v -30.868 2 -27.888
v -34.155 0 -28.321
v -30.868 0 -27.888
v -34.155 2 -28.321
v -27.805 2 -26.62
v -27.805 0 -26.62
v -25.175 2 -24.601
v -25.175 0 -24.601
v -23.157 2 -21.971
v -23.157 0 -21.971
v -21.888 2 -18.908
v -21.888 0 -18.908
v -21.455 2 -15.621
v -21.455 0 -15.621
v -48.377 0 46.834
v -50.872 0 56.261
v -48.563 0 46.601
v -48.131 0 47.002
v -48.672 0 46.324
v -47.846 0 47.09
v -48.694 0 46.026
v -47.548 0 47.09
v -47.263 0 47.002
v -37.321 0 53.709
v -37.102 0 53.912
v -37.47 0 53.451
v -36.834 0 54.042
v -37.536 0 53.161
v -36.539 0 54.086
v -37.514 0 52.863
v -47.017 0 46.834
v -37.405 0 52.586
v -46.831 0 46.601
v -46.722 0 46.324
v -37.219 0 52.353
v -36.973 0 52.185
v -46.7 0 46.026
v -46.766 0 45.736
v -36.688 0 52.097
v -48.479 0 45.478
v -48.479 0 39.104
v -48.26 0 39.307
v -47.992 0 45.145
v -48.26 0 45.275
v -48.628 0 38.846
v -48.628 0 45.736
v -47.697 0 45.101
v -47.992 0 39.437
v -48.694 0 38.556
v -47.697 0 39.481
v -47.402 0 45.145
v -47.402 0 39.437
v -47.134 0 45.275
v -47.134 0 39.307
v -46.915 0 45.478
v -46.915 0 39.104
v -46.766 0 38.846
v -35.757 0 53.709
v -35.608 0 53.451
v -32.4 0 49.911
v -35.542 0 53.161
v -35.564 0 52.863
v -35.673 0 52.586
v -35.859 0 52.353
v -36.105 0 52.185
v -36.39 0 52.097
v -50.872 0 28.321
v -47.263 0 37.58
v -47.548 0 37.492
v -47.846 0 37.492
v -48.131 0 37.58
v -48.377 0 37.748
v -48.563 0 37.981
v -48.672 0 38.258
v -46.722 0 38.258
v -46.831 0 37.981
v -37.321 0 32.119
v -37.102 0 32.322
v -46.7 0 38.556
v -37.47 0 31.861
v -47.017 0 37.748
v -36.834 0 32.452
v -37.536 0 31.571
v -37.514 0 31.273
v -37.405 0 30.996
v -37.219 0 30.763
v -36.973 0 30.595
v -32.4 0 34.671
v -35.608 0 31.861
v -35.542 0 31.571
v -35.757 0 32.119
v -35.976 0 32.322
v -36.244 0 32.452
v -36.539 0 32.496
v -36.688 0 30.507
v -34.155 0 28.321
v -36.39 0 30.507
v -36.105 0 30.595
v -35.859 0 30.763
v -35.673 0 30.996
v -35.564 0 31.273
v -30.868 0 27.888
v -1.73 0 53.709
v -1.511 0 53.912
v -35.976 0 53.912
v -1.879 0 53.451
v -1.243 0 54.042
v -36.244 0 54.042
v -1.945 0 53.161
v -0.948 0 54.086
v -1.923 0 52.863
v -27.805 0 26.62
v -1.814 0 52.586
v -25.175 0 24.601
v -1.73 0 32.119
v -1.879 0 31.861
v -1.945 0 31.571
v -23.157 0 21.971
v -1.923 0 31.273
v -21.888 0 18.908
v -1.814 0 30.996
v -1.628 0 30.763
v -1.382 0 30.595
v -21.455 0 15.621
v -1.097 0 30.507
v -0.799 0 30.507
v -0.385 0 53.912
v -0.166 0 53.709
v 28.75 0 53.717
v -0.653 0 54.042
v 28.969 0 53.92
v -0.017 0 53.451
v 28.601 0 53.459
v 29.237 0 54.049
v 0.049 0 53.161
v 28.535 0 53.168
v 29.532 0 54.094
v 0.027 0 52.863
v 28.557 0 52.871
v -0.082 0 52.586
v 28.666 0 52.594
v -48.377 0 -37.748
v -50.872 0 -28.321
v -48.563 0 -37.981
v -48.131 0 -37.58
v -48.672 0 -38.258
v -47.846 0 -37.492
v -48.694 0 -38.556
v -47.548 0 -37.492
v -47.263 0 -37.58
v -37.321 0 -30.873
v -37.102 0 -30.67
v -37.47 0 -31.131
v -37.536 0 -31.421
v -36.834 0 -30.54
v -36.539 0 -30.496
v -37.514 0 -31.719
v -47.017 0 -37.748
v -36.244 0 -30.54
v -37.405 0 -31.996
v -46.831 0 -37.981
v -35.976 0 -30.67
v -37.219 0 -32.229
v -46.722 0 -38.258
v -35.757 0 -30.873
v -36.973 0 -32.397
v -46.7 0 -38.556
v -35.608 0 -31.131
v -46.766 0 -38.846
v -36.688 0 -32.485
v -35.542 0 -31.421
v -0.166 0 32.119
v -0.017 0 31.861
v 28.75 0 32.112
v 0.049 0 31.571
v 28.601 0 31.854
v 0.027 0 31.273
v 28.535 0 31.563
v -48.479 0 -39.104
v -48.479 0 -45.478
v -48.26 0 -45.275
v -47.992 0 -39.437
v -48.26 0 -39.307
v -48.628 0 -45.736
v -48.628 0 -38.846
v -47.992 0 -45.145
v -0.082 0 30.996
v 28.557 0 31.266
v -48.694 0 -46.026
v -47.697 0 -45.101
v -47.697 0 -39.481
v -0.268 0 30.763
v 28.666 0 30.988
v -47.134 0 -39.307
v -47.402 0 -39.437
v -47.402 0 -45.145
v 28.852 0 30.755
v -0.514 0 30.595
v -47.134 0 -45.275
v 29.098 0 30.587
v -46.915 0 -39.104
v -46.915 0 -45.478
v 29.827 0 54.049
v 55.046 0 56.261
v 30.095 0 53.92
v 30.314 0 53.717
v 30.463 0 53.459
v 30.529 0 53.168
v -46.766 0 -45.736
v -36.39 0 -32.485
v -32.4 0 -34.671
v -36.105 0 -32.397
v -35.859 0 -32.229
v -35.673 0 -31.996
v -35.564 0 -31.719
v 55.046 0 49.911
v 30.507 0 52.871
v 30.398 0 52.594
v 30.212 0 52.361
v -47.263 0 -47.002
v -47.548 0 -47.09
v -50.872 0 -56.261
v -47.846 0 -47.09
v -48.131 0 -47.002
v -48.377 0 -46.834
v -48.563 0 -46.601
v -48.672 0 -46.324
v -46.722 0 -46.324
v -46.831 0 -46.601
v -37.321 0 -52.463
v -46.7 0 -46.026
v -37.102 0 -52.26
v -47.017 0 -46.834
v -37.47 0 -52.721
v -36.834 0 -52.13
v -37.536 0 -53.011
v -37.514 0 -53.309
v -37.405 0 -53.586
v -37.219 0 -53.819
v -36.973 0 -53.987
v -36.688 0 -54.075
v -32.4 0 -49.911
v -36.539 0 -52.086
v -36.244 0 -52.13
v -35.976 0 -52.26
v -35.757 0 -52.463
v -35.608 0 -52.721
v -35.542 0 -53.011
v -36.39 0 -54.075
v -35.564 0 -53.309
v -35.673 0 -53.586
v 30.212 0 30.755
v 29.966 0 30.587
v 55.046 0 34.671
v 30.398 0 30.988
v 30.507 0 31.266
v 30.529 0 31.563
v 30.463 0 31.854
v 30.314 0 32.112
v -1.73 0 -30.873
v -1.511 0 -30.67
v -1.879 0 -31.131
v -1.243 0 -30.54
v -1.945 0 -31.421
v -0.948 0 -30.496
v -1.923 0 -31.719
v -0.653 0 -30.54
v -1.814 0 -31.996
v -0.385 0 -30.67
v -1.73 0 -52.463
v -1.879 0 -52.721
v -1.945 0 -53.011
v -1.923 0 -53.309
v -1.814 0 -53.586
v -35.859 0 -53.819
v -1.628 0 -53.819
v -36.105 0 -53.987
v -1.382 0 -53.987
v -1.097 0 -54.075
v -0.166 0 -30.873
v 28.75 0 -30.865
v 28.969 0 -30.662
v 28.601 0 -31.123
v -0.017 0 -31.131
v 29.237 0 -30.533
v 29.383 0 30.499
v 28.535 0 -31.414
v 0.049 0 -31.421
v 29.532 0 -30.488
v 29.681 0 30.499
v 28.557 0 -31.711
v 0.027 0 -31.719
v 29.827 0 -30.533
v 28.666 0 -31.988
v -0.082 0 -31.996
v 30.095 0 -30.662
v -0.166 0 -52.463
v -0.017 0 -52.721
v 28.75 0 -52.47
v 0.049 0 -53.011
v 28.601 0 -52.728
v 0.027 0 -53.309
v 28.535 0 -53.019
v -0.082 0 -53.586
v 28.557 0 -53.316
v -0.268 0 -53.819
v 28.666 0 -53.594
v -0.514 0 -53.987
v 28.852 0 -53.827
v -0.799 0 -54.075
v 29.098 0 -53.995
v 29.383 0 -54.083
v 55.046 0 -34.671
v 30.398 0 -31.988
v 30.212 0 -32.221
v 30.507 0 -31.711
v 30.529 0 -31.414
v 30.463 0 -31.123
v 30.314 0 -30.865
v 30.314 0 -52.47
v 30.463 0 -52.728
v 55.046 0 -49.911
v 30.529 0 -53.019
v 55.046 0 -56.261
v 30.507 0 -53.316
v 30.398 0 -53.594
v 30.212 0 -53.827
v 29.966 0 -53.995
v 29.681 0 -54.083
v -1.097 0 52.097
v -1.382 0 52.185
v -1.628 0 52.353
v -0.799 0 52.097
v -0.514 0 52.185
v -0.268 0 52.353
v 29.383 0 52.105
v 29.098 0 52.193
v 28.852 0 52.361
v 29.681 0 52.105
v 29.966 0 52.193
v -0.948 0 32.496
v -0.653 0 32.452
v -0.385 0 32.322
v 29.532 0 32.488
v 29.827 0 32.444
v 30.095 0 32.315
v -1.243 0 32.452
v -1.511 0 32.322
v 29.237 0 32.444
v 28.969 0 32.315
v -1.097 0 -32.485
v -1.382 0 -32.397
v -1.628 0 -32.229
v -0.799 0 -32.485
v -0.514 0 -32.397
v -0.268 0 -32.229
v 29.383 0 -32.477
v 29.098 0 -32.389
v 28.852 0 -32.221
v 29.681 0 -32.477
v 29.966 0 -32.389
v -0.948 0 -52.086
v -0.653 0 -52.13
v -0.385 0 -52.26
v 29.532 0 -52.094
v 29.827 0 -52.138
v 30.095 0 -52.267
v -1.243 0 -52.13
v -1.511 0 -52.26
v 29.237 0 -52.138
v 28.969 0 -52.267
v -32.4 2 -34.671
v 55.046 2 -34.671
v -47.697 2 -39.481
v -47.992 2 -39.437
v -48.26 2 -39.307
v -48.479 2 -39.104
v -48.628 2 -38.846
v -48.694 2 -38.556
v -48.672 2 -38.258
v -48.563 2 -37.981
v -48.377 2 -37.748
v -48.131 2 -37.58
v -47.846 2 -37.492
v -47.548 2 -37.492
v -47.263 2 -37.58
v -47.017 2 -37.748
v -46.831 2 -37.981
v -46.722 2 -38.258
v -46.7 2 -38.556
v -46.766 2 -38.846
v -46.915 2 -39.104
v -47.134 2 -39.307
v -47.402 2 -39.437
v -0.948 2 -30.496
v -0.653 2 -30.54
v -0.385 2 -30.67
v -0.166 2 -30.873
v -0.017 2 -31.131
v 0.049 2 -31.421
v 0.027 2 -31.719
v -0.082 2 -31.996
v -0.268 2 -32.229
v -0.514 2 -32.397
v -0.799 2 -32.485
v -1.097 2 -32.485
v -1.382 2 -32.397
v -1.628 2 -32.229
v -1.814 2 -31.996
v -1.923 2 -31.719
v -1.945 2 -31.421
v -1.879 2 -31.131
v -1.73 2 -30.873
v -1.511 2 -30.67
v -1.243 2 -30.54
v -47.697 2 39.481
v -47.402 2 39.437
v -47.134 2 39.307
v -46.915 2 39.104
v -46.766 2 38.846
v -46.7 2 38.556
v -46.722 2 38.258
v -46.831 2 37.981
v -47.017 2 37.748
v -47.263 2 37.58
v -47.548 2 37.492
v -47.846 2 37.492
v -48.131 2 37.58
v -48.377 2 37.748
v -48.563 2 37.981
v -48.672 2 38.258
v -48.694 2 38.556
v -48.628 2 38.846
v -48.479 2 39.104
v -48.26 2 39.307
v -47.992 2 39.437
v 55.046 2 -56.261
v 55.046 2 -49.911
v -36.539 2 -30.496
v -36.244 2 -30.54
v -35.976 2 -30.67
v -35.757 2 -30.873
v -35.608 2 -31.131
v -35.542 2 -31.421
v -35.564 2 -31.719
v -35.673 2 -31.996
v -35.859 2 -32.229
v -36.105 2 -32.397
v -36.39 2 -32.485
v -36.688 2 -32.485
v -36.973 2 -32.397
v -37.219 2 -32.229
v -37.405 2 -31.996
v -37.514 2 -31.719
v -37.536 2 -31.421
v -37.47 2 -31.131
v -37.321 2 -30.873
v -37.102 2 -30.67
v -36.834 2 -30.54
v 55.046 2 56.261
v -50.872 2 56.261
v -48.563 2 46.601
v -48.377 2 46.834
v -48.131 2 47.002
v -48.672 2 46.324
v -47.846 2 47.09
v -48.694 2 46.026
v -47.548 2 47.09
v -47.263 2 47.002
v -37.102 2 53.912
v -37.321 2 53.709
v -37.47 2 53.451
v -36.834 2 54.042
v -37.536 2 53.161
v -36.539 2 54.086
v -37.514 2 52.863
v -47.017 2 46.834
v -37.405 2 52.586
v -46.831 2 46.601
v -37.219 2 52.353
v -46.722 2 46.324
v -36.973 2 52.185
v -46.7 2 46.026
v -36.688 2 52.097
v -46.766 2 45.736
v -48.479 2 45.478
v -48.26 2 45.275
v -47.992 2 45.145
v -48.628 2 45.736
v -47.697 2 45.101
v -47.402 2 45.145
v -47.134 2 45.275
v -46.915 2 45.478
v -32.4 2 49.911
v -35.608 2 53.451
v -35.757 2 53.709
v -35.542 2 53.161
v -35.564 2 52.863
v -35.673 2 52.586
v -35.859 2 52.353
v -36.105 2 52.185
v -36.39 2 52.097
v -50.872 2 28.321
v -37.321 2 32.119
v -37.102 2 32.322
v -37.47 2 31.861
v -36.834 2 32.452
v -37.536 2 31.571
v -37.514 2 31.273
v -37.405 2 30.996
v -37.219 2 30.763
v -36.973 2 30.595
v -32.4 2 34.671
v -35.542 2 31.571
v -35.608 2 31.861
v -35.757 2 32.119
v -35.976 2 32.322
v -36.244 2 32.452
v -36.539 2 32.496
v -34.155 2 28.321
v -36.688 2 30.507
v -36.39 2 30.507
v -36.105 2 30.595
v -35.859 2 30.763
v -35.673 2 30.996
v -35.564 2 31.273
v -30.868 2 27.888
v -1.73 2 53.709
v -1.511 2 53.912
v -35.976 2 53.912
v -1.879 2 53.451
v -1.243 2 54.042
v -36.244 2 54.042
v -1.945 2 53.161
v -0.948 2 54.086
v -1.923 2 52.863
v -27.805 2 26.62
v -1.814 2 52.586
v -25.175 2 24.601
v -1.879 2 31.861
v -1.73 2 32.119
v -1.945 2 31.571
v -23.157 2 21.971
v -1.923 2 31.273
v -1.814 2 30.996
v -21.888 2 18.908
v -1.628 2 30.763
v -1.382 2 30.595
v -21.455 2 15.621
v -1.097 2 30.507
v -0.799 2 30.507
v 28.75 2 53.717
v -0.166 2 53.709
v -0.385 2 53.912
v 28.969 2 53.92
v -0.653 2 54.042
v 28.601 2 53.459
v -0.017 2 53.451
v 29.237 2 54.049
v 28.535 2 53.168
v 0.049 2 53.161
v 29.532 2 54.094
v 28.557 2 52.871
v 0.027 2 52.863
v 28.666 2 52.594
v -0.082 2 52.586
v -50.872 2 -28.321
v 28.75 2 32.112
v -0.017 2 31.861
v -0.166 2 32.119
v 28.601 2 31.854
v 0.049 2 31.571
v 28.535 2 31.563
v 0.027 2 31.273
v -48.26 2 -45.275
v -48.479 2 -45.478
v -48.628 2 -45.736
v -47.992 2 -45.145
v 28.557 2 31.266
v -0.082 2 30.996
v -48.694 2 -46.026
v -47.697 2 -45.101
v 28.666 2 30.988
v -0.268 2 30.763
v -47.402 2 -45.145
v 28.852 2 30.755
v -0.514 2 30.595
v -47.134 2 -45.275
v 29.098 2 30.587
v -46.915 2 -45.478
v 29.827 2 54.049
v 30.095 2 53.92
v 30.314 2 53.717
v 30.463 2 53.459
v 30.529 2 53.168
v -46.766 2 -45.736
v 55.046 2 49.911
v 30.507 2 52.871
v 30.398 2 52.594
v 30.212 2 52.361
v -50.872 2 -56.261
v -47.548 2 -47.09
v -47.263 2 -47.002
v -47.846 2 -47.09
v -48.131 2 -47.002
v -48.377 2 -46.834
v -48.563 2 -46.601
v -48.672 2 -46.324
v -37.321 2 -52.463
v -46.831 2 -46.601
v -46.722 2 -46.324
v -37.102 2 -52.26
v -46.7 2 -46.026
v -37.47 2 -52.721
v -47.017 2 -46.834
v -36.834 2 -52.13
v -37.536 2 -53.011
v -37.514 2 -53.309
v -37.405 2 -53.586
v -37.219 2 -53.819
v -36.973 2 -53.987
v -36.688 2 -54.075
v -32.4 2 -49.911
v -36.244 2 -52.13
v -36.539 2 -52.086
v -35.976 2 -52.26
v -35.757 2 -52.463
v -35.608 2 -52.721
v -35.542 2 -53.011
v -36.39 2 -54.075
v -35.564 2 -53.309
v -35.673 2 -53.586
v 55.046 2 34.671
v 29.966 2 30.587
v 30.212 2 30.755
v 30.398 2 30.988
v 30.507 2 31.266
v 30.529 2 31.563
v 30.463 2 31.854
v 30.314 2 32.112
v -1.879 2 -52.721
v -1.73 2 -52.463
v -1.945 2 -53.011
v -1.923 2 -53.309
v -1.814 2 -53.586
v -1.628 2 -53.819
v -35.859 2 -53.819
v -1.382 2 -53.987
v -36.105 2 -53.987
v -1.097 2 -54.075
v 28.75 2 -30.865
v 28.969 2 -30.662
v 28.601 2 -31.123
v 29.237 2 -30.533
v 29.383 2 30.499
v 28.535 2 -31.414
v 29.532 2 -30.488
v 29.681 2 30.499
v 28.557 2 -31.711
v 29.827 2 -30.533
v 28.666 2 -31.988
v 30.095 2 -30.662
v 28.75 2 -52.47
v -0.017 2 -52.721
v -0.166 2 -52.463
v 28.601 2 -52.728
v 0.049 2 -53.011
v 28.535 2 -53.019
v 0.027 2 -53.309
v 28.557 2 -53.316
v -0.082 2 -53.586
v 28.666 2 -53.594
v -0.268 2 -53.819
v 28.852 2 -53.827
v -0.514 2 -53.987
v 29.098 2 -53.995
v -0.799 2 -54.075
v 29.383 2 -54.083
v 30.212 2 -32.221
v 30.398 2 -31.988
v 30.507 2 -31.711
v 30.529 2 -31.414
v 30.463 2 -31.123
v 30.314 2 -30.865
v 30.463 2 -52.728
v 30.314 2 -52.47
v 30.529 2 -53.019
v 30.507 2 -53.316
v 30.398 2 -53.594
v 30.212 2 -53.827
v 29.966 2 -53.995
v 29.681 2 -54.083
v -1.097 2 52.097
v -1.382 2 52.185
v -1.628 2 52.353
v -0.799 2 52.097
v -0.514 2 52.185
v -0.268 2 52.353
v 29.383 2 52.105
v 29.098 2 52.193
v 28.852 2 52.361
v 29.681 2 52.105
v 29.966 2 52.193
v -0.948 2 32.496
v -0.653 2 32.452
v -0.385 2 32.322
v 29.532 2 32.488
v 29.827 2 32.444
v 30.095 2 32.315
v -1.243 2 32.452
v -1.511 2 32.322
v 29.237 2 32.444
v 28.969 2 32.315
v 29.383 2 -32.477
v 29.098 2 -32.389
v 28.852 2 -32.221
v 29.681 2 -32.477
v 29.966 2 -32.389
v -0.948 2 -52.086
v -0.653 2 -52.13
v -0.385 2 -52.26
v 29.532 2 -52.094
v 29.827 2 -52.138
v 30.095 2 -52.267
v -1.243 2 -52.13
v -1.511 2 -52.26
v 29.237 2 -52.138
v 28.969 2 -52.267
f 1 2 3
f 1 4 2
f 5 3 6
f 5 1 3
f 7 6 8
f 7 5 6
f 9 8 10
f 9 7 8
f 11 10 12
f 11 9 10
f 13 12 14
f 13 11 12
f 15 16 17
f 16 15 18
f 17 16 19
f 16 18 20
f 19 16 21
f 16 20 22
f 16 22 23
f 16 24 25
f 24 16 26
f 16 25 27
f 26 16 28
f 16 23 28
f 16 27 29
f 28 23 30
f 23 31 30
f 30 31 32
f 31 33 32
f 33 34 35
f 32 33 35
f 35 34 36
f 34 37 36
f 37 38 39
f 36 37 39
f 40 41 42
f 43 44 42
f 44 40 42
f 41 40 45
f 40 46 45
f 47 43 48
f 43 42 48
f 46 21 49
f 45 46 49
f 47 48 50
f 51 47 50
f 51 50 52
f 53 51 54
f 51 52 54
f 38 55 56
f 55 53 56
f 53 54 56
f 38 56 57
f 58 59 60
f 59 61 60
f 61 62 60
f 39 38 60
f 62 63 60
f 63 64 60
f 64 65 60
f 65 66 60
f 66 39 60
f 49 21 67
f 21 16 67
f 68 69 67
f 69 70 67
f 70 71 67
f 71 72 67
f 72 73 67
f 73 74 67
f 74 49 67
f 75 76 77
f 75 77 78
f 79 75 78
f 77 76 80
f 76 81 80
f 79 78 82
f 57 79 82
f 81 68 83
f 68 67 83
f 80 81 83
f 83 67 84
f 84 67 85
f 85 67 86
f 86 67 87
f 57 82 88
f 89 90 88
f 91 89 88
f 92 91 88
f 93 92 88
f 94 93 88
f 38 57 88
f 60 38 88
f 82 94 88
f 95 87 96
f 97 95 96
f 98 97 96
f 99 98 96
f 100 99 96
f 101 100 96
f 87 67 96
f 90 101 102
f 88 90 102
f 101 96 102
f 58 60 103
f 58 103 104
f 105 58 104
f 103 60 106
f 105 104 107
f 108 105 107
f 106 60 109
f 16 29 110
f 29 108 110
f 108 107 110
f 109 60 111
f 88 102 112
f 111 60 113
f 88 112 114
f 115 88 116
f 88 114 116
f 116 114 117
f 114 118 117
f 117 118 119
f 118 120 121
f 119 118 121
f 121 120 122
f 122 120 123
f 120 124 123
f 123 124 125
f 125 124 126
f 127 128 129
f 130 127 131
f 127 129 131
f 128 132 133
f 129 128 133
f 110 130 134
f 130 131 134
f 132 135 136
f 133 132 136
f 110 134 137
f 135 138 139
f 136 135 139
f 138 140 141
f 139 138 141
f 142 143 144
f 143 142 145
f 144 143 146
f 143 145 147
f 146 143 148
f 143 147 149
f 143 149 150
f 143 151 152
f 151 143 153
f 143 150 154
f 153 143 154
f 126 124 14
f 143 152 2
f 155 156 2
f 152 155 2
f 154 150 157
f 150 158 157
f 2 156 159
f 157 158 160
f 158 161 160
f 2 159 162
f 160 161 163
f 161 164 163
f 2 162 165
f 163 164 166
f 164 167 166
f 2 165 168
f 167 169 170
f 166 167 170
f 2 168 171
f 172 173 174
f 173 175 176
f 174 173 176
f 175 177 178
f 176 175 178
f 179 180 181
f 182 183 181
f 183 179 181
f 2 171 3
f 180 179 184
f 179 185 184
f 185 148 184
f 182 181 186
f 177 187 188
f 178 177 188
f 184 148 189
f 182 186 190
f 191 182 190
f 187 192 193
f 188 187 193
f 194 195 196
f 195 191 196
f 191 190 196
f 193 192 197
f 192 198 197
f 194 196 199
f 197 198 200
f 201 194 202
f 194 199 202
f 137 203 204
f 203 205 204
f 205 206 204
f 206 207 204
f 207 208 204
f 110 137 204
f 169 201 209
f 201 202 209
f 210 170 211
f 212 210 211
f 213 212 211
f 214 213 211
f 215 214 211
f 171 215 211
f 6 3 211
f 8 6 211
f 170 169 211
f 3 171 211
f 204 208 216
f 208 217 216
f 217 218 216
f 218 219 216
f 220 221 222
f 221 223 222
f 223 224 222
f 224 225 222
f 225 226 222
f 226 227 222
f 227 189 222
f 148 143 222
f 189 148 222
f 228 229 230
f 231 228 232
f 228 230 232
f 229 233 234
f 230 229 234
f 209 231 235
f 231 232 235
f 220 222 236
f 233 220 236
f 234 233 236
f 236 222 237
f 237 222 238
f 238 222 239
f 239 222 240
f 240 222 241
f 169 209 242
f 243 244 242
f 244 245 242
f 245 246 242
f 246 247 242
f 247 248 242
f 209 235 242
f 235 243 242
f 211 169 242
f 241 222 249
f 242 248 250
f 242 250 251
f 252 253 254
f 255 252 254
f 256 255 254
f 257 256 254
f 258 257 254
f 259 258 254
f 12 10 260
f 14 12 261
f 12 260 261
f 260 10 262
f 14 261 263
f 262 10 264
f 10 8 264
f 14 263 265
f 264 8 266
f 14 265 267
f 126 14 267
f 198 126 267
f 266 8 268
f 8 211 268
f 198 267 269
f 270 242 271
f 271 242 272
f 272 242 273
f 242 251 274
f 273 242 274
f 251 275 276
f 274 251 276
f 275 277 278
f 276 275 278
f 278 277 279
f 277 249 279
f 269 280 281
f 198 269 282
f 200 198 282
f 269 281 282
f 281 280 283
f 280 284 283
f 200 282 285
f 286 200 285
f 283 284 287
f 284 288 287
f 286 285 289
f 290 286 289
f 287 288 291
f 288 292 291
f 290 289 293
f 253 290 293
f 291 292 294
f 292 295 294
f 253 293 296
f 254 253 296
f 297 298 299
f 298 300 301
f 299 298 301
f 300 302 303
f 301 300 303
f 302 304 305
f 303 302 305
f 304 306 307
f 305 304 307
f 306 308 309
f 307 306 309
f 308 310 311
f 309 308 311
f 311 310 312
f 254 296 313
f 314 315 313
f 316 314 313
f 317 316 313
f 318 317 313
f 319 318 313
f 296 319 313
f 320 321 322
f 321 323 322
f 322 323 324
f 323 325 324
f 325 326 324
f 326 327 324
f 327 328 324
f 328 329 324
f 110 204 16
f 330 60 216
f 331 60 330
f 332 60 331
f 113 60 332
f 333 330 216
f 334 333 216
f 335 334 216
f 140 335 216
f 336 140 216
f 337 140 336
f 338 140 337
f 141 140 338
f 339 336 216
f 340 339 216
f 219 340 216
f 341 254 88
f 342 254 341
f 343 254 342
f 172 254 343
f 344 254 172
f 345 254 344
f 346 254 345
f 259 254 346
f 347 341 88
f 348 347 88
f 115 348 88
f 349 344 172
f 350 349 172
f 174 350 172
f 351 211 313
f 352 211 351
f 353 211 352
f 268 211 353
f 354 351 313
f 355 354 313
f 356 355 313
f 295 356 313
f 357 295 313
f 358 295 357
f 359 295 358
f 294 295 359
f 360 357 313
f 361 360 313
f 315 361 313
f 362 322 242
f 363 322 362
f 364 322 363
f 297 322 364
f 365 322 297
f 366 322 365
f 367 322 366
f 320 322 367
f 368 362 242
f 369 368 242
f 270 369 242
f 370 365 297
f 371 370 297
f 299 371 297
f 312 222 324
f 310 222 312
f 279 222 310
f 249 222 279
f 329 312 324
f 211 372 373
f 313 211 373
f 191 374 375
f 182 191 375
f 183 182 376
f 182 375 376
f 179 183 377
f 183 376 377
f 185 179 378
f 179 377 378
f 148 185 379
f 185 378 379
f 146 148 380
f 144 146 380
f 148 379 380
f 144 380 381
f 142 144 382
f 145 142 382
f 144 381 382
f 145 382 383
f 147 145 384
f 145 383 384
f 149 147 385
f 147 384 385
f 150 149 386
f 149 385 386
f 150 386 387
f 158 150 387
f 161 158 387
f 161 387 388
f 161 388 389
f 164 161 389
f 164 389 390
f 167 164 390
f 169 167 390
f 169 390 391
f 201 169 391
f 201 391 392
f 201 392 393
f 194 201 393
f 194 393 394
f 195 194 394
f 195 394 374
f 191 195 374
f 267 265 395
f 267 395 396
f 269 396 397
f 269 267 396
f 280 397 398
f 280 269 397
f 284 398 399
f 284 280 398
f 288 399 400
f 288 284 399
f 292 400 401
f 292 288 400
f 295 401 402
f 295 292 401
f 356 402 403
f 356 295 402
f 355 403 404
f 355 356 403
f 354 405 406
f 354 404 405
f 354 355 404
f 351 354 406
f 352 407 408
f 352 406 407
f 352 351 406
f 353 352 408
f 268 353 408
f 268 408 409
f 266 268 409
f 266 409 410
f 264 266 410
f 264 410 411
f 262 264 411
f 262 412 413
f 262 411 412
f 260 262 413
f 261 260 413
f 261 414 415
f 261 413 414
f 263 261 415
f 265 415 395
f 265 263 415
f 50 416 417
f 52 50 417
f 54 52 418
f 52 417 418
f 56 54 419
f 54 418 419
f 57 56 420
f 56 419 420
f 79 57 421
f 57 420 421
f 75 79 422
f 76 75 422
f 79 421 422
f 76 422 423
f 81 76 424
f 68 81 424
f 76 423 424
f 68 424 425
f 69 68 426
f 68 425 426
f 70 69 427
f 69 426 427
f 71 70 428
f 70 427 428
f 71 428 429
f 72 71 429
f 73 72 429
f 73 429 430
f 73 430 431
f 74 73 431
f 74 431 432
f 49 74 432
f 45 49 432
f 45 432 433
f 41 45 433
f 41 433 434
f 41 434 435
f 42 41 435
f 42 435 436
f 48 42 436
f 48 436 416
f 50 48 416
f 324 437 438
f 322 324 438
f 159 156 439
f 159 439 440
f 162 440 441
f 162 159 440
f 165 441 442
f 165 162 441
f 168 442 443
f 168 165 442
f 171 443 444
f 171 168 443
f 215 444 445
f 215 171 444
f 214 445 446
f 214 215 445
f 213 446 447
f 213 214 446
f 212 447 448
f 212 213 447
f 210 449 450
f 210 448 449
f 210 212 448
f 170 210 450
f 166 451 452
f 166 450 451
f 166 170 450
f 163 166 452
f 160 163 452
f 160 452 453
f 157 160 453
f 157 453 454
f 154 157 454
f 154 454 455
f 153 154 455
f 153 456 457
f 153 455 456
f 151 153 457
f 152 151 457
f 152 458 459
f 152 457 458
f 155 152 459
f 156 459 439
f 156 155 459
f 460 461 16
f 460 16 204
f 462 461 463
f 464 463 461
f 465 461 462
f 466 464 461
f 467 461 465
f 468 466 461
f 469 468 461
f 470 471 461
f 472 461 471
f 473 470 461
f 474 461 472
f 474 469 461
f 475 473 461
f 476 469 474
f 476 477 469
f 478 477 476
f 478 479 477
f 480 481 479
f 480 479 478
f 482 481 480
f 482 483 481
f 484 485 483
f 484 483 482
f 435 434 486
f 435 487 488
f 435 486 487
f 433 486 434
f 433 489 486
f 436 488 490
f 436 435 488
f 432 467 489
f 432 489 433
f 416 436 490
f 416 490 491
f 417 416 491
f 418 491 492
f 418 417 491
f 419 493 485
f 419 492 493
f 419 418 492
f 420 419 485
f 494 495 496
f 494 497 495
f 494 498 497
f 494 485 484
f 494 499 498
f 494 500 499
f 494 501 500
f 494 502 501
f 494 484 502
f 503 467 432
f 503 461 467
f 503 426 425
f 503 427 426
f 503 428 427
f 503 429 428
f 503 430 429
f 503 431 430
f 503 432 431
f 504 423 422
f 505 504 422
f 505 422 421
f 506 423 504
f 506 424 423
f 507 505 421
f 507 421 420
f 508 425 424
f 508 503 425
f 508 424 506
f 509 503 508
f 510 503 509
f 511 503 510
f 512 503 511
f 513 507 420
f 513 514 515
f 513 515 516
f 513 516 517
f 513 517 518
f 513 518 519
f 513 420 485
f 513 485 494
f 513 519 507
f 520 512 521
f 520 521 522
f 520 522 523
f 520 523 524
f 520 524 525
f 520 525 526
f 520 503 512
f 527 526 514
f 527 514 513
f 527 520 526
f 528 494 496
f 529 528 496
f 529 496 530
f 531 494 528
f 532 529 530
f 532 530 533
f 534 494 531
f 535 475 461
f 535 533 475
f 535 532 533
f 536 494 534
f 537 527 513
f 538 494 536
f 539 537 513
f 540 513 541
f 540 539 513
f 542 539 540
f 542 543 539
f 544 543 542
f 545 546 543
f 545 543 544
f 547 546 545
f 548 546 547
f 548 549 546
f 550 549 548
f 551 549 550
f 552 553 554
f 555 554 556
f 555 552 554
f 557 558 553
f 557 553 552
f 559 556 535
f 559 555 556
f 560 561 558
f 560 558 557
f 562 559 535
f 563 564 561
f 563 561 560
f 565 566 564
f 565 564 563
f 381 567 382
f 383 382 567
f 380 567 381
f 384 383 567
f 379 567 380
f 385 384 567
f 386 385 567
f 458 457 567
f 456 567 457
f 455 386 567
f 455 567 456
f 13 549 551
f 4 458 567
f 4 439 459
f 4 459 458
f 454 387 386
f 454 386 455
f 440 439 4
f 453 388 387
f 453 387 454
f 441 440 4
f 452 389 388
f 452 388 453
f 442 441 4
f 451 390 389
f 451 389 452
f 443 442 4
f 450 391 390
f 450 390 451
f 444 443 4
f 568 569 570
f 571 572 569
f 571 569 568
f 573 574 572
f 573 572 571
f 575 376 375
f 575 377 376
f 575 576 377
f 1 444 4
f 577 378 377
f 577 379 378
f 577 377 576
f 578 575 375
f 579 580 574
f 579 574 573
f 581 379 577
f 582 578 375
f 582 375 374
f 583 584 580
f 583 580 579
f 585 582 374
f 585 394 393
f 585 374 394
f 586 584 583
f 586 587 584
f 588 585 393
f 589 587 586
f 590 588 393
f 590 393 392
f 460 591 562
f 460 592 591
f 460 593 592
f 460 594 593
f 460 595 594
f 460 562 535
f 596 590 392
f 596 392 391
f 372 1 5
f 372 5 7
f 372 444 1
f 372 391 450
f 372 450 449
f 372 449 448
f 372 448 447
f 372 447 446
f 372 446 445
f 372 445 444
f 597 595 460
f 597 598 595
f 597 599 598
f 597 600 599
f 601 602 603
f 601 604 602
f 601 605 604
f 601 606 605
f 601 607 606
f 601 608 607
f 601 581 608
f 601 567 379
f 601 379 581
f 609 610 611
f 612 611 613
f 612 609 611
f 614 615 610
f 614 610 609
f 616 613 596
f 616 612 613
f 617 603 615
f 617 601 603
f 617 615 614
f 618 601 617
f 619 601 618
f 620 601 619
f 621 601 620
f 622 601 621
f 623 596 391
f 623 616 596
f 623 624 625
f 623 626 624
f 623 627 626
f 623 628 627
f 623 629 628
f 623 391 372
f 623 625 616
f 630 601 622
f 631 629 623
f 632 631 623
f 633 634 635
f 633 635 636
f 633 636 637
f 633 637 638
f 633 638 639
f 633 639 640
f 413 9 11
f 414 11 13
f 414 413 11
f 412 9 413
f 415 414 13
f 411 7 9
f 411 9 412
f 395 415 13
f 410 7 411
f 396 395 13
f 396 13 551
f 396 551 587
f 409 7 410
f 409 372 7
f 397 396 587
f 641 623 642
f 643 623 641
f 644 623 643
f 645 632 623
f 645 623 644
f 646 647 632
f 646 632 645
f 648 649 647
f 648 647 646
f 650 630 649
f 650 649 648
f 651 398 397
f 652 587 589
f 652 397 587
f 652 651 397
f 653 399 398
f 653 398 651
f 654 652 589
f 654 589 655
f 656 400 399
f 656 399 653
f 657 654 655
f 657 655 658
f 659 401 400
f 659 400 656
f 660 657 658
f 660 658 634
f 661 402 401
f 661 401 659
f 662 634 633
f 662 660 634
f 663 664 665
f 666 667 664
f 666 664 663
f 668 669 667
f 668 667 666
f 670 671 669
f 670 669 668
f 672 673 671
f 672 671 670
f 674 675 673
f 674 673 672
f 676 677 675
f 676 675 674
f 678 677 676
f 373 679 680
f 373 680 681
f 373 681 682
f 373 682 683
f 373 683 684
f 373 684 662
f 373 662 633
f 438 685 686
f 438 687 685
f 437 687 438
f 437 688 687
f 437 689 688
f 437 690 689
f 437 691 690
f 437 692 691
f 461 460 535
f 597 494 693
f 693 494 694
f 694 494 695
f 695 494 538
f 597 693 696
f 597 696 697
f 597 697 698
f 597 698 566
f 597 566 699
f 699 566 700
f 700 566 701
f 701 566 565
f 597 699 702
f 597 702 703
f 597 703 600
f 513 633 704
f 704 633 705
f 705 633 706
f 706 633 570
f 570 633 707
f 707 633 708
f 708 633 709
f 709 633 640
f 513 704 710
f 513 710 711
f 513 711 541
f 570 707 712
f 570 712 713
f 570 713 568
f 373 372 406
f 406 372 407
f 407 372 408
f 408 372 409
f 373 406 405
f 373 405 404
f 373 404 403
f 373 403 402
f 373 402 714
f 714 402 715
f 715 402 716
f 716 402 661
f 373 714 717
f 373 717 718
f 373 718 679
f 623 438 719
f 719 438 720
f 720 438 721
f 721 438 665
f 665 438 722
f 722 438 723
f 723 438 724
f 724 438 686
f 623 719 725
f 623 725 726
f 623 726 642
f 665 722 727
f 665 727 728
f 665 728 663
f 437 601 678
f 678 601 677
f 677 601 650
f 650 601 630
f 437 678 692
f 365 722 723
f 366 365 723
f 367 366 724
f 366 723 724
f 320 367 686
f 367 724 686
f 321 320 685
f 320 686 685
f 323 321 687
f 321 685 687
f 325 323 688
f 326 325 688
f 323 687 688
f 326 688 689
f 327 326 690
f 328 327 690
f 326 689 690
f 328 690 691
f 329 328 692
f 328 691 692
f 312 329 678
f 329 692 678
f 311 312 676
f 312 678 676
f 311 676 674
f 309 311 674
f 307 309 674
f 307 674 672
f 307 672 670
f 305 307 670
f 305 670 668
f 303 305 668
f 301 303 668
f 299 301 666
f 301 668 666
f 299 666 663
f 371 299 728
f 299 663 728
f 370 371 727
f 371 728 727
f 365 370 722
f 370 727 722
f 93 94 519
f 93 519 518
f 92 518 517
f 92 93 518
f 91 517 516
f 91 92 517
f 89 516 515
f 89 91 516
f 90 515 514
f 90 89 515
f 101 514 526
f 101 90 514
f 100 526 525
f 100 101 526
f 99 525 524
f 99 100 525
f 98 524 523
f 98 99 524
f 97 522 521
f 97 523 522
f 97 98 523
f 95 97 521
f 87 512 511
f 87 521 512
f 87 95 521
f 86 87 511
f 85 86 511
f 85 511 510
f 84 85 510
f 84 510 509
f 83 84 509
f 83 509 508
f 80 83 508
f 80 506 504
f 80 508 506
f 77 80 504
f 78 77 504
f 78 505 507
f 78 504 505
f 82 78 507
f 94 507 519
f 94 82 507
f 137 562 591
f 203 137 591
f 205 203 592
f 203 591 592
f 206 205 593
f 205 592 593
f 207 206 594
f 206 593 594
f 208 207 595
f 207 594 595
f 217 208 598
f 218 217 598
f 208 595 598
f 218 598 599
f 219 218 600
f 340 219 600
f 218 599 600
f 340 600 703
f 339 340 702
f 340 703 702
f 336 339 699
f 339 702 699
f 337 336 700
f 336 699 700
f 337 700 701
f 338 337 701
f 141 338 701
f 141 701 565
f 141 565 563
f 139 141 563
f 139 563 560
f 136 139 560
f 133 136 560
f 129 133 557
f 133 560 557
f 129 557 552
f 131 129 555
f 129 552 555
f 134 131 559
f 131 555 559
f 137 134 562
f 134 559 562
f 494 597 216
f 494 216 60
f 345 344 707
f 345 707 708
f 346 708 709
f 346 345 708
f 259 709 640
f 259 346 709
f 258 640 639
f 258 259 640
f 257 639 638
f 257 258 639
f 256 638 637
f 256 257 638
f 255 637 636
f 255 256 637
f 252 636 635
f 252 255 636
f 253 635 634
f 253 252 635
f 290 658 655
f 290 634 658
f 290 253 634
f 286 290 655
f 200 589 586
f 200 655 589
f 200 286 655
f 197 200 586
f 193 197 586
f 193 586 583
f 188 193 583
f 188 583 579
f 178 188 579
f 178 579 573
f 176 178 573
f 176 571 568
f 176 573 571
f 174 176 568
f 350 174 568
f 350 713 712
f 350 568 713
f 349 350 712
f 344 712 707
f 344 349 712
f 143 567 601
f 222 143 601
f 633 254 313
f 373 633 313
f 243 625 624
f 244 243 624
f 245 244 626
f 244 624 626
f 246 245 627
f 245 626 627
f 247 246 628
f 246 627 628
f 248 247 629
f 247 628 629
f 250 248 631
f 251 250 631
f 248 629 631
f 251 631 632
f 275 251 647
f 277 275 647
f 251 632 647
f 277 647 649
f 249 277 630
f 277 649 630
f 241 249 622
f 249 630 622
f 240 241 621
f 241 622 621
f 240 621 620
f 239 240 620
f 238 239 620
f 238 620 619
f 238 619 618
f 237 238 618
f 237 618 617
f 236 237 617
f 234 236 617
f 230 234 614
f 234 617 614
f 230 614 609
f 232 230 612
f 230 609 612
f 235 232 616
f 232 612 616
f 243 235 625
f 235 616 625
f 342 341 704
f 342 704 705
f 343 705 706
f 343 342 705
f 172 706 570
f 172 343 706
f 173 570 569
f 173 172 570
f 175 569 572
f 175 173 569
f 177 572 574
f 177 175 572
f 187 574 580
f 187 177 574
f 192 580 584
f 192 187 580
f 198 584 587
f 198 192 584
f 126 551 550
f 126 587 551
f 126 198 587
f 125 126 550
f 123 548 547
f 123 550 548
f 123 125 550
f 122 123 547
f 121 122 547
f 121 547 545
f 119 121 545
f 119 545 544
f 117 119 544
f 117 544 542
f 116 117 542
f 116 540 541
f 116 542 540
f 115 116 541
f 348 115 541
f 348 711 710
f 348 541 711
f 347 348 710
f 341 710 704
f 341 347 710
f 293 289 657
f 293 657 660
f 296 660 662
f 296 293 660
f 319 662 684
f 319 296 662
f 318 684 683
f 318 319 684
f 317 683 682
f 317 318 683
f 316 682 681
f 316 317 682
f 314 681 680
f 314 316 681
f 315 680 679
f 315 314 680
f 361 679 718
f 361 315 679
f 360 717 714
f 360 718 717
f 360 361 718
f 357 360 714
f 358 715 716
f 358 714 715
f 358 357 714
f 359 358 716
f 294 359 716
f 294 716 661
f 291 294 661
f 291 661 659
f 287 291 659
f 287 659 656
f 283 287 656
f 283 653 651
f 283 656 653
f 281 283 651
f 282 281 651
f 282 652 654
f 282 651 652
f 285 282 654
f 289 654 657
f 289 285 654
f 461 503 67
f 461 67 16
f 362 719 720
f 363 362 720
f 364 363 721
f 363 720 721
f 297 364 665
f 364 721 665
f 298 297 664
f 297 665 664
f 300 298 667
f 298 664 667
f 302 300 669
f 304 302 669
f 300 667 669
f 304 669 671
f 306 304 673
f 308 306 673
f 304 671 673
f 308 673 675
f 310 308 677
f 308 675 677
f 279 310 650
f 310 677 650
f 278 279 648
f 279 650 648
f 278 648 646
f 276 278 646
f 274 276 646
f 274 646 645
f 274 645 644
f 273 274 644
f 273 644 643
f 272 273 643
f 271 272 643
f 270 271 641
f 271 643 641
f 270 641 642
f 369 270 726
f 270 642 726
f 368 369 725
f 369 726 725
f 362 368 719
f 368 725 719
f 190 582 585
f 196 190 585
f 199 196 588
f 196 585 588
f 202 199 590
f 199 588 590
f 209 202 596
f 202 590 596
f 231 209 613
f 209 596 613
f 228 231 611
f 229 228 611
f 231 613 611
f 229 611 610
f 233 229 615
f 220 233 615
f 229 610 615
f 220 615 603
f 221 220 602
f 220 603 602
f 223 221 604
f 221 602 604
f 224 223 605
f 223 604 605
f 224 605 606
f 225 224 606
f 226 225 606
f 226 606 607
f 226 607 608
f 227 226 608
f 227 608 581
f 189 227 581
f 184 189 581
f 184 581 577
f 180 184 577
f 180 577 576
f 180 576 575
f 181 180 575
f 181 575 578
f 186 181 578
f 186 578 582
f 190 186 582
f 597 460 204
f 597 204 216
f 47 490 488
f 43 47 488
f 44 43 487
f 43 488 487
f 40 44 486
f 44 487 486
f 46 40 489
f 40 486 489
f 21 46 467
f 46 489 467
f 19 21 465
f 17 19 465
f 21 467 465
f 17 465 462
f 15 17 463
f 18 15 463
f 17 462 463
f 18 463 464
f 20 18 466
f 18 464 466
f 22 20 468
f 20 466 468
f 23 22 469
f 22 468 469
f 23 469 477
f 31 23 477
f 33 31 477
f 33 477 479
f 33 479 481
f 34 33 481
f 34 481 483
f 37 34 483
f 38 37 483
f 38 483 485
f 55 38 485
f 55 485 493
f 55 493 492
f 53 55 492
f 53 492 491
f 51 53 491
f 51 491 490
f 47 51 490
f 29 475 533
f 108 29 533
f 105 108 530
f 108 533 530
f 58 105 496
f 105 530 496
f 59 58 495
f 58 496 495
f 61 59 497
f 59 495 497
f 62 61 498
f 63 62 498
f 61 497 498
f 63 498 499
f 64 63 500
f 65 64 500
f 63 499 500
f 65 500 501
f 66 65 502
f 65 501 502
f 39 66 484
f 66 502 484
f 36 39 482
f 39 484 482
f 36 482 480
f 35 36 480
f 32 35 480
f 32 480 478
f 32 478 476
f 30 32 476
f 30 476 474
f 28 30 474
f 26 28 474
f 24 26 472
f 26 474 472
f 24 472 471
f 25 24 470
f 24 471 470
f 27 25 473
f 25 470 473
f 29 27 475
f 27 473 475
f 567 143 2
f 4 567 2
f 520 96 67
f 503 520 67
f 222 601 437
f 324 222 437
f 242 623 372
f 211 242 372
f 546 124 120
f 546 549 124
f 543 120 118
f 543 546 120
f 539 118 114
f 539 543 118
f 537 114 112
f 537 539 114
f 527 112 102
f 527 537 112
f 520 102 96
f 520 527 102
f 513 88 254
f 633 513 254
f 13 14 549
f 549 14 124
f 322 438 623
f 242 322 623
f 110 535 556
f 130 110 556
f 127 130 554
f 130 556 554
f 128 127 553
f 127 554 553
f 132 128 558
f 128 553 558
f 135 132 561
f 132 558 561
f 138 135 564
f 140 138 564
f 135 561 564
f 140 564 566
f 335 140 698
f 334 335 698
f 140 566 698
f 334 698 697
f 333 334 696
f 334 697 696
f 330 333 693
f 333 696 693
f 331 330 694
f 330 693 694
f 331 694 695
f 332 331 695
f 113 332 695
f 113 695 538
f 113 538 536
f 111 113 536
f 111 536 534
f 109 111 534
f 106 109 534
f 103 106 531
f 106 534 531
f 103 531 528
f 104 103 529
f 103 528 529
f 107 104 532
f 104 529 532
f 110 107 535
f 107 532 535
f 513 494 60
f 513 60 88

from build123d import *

# Parameters (mm, degrees)
BOSS_EXTRUDE1_DEPTH     = 2
FILLET1_R               = 12.7
CUT_EXTRUDE1_DEPTH      = 85.94357346
CUT_EXTRUDE1_DEPTH_BACK = 85.94357346
SKETCH2_R               = 1.00000054
CUT_EXTRUDE2_DEPTH      = 85.94357346
CUT_EXTRUDE2_DEPTH_BACK = 85.94357346
SKETCH3_W               = 3.81
SKETCH3_H               = 22.86
CUT_EXTRUDE3_DEPTH      = 85.94357346
CUT_EXTRUDE4_DEPTH      = 85.94357346
SKETCH7_R               = 1.00000054
SKETCH7_W               = 1.965807504
SKETCH7_H               = 35.56
CUT_EXTRUDE5_DEPTH      = 85.94357346
SKETCH9_R               = 1.00000054
SKETCH9_W               = 5.08
SKETCH9_H               = 35.56
CUT_EXTRUDE6_DEPTH      = 85.94357346
SKETCH10_W              = 3.261861975
SKETCH10_H              = 39.805650988
SKETCH10_W_2            = 3.49604191
SKETCH10_H_2            = 37.586377376
BOSS_EXTRUDE2_DEPTH     = 2
SKETCH11_W              = 18.472083706
SKETCH11_H              = 7.62
CUT_EXTRUDE7_DEPTH      = 85.349523446
CUT_EXTRUDE8_DEPTH      = 85.349523446
SKETCH13_R              = 1.00000054
BOSS_EXTRUDE3_DEPTH     = 2
CUT_EXTRUDE9_DEPTH      = 85.349523446
SKETCH15_R              = 1.00000054
BOSS_EXTRUDE6_DEPTH     = 2
SKETCH16_W              = 4.512091431
SKETCH16_H              = 18.148634424
SKETCH16_W_2            = 6.251984605
SKETCH16_H_2            = 13.072331447
BOSS_EXTRUDE7_DEPTH     = 2
SKETCH17_R              = 1.00000054
CUT_EXTRUDE10_DEPTH     = 79.736015048
SKETCH18_W              = 71.149585785
SKETCH18_H              = 51.177772232
BOSS_EXTRUDE8_DEPTH     = 2


with BuildPart() as part:
    # Sketch1 → Boss-Extrude1 (new body)
    with BuildSketch(Plane(origin=(0, 0, 0), x_dir=(1, 0, 0), z_dir=(0, 1, 0))):
        Polygon((-55.952019723, 28.533921393), (-55.951080052, 28.321), (-21.455288819, 28.321), (-21.455288819, -28.321), (-55.952019723, -28.321), (-55.952019723, -63.881), (55.045980277, -63.881), (55.045980277, -57.531), (32.458455221, -57.531), (-28.589936017, -57.531), (-28.589936017, -46.101), (-28.589936017, -34.671), (32.458455221, -34.671), (55.045980277, -34.671), (55.045980277, 34.671), (32.458455221, 34.671), (-28.589936017, 34.671), (-28.589936017, 46.101), (-28.589936017, 57.531), (32.458455221, 57.531), (55.045980277, 57.531), (55.045980277, 63.881), (-55.952019723, 63.881), align=None)
    extrude(amount=BOSS_EXTRUDE1_DEPTH)

    # Fillet1
    fillet1_edges = [part.edges().sort_by_distance(p)[0] for p in [
        (-21.455288819, 1, 28.321),
        (-21.455288819, 1, -28.321),
    ]]
    fillet(fillet1_edges, radius=FILLET1_R)

    # Sketch2 → Cut-Extrude1 (cut, two sides: drawn at the far end of the back side and taken through both)
    with BuildSketch(Plane(origin=(0, 2, 0), x_dir=(1, 0, 0), z_dir=(0, 1, 0)).offset(-CUT_EXTRUDE1_DEPTH_BACK)):
        with Locations(Location((51.870980277, 0, 0), (0, 0, 270))):
            Circle(SKETCH2_R)
        with Locations(Location((51.870980277, 14.1605, 0), (0, 0, 270))):
            Circle(SKETCH2_R)
        with Locations(Location((-18.280288819, 0, 0), (0, 0, 270))):
            Circle(SKETCH2_R)
        with Locations(Location((-18.280288819, -14.1605, 0), (0, 0, 270))):
            Circle(SKETCH2_R)
        with Locations(Location((-18.280288819, 14.1605, 0), (0, 0, 270))):
            Circle(SKETCH2_R)
        with Locations(Location((-36.538995414, 31.496, 0), (0, 0, 270))):
            Circle(SKETCH2_R)
        with Locations(Location((-0.948104424, 31.496, 0), (0, 0, 270))):
            Circle(SKETCH2_R)
        with Locations(Location((29.531895576, 31.488302757, 0), (0, 0, 270))):
            Circle(SKETCH2_R)
        with Locations(Location((-52.777019723, 45.1485, 0), (0, 0, 270))):
            Circle(SKETCH2_R)
        with Locations(Location((-52.777019723, 53.4035, 0), (0, 0, 270))):
            Circle(SKETCH2_R)
        with Locations(Location((-36.538995414, 60.706, 0), (0, 0, 270))):
            Circle(SKETCH2_R)
        with Locations(Location((-0.948104424, 60.706, 0), (0, 0, 270))):
            Circle(SKETCH2_R)
        with Locations(Location((29.531895576, 60.713697243, 0), (0, 0, 270))):
            Circle(SKETCH2_R)
        with Locations(Location((29.531895576, -60.713697243, 0), (0, 0, 270))):
            Circle(SKETCH2_R)
        with Locations(Location((-0.948104424, -60.706, 0), (0, 0, 270))):
            Circle(SKETCH2_R)
        with Locations(Location((-36.538995414, -60.706, 0), (0, 0, 270))):
            Circle(SKETCH2_R)
        with Locations(Location((-52.777019723, -53.4035, 0), (0, 0, 270))):
            Circle(SKETCH2_R)
        with Locations(Location((-52.777019723, -45.1485, 0), (0, 0, 270))):
            Circle(SKETCH2_R)
        with Locations(Location((29.531895576, -31.488302757, 0), (0, 0, 270))):
            Circle(SKETCH2_R)
        with Locations(Location((-0.948104424, -31.496, 0), (0, 0, 270))):
            Circle(SKETCH2_R)
        with Locations(Location((-36.538995414, -31.496, 0), (0, 0, 270))):
            Circle(SKETCH2_R)
        with Locations(Location((51.870980277, -14.1605, 0), (0, 0, 270))):
            Circle(SKETCH2_R)
    extrude(amount=CUT_EXTRUDE1_DEPTH + CUT_EXTRUDE1_DEPTH_BACK, mode=Mode.SUBTRACT)

    # Sketch3 → Cut-Extrude2 (cut, two sides: drawn at the far end of the back side and taken through both)
    with BuildSketch(Plane(origin=(0, 2, 0), x_dir=(1, 0, 0), z_dir=(0, 1, 0)).offset(-CUT_EXTRUDE2_DEPTH_BACK)):
        with Locations((-30.494936017, -46.101)):
            Rectangle(SKETCH3_W, SKETCH3_H)
        with Locations((-30.494936017, 46.101)):
            Rectangle(SKETCH3_W, SKETCH3_H)
    extrude(amount=CUT_EXTRUDE2_DEPTH + CUT_EXTRUDE2_DEPTH_BACK, mode=Mode.SUBTRACT)

    # Sketch5 → Cut-Extrude3 (cut, through all)
    with BuildSketch(Plane(origin=(0, 2, 0), x_dir=(1, 0, 0), z_dir=(0, 1, 0))):
        with BuildLine():
            Line((-7.280288819, 22.171), (-7.280288819, 6.25))
            ThreePointArc((-7.280288819, 6.25), (-8.280288819, 5.25), (-9.280288819, 6.25))
            Line((-9.280288819, 6.25), (-9.280288819, 22.171))
            ThreePointArc((-9.280288819, 22.171), (-8.280288819, 23.171), (-7.280288819, 22.171))
        make_face()
        with BuildLine():
            Line((-7.280288819, -22.171), (-7.280288819, -6.25))
            ThreePointArc((-7.280288819, -6.25), (-8.280288819, -5.25), (-9.280288819, -6.25))
            Line((-9.280288819, -6.25), (-9.280288819, -22.171))
            ThreePointArc((-9.280288819, -22.171), (-8.280288819, -23.171), (-7.280288819, -22.171))
        make_face()
        with BuildLine():
            Line((-4.280288819, 22.171), (-4.280288819, 6.25))
            ThreePointArc((-4.280288819, 6.25), (-3.280288819, 5.25), (-2.280288819, 6.25))
            Line((-2.280288819, 6.25), (-2.280288819, 22.171))
            ThreePointArc((-2.280288819, 22.171), (-3.280288819, 23.171), (-4.280288819, 22.171))
        make_face()
        with BuildLine():
            Line((2.719711181, 22.171), (2.719711181, 6.25))
            ThreePointArc((2.719711181, 6.25), (1.719711181, 5.25), (0.719711181, 6.25))
            Line((0.719711181, 6.25), (0.719711181, 22.171))
            ThreePointArc((0.719711181, 22.171), (1.719711181, 23.171), (2.719711181, 22.171))
        make_face()
        with BuildLine():
            Line((2.719711181, -22.171), (2.719711181, -6.25))
            ThreePointArc((2.719711181, -6.25), (1.719711181, -5.25), (0.719711181, -6.25))
            Line((0.719711181, -6.25), (0.719711181, -22.171))
            ThreePointArc((0.719711181, -22.171), (1.719711181, -23.171), (2.719711181, -22.171))
        make_face()
        with BuildLine():
            Line((-4.280288819, -22.171), (-4.280288819, -6.25))
            ThreePointArc((-4.280288819, -6.25), (-3.280288819, -5.25), (-2.280288819, -6.25))
            Line((-2.280288819, -6.25), (-2.280288819, -22.171))
            ThreePointArc((-2.280288819, -22.171), (-3.280288819, -23.171), (-4.280288819, -22.171))
        make_face()
    extrude(amount=-CUT_EXTRUDE3_DEPTH, mode=Mode.SUBTRACT)

    # Sketch6 → Cut-Extrude4 (cut, through all)
    with BuildSketch(Plane(origin=(0, 2, 0), x_dir=(1, 0, 0), z_dir=(0, 1, 0))):
        with BuildLine():
            Line((23.282365986, 8.144284406), (12.061731324, 4.060307379))
            ThreePointArc((12.061731324, 4.060307379), (10.78001856, 4.657979857), (11.377691038, 5.939692621))
            Line((11.377691038, 5.939692621), (22.598325699, 10.023669647))
            ThreePointArc((22.598325699, 10.023669647), (23.880038464, 9.42599717), (23.282365986, 8.144284406))
        make_face()
        with BuildLine():
            Line((35.782365986, 8.144284406), (24.561731324, 4.060307379))
            ThreePointArc((24.561731324, 4.060307379), (23.28001856, 4.657979857), (23.877691038, 5.939692621))
            Line((23.877691038, 5.939692621), (35.098325699, 10.023669647))
            ThreePointArc((35.098325699, 10.023669647), (36.380038464, 9.42599717), (35.782365986, 8.144284406))
        make_face()
        with BuildLine():
            Line((48.282365986, 8.144284406), (37.061731324, 4.060307379))
            ThreePointArc((37.061731324, 4.060307379), (35.78001856, 4.657979857), (36.377691038, 5.939692621))
            Line((36.377691038, 5.939692621), (47.598325699, 10.023669647))
            ThreePointArc((47.598325699, 10.023669647), (48.880038464, 9.42599717), (48.282365986, 8.144284406))
        make_face()
        with BuildLine():
            Line((23.212938712, 16.811828882), (11.992304051, 12.727851856))
            ThreePointArc((11.992304051, 12.727851856), (10.710591286, 13.325524333), (11.308263764, 14.607237098))
            Line((11.308263764, 14.607237098), (22.528898426, 18.691214124))
            ThreePointArc((22.528898426, 18.691214124), (23.81061119, 18.093541647), (23.212938712, 16.811828882))
        make_face()
        with BuildLine():
            Line((35.712938712, 16.811828882), (24.492304051, 12.727851856))
            ThreePointArc((24.492304051, 12.727851856), (23.210591286, 13.325524333), (23.808263764, 14.607237098))
            Line((23.808263764, 14.607237098), (35.028898426, 18.691214124))
            ThreePointArc((35.028898426, 18.691214124), (36.31061119, 18.093541647), (35.712938712, 16.811828882))
        make_face()
        with BuildLine():
            Line((48.212938712, 16.811828882), (36.992304051, 12.727851856))
            ThreePointArc((36.992304051, 12.727851856), (35.710591286, 13.325524333), (36.308263764, 14.607237098))
            Line((36.308263764, 14.607237098), (47.528898426, 18.691214124))
            ThreePointArc((47.528898426, 18.691214124), (48.81061119, 18.093541647), (48.212938712, 16.811828882))
        make_face()
        with BuildLine():
            Line((48.282365986, -8.144284406), (37.061731324, -4.060307379))
            ThreePointArc((37.061731324, -4.060307379), (35.78001856, -4.657979857), (36.377691038, -5.939692621))
            Line((36.377691038, -5.939692621), (47.598325699, -10.023669647))
            ThreePointArc((47.598325699, -10.023669647), (48.880038464, -9.42599717), (48.282365986, -8.144284406))
        make_face()
        with BuildLine():
            Line((35.782365986, -8.144284406), (24.561731324, -4.060307379))
            ThreePointArc((24.561731324, -4.060307379), (23.28001856, -4.657979857), (23.877691038, -5.939692621))
            Line((23.877691038, -5.939692621), (35.098325699, -10.023669647))
            ThreePointArc((35.098325699, -10.023669647), (36.380038464, -9.42599717), (35.782365986, -8.144284406))
        make_face()
        with BuildLine():
            Line((23.282365986, -8.144284406), (12.061731324, -4.060307379))
            ThreePointArc((12.061731324, -4.060307379), (10.78001856, -4.657979857), (11.377691038, -5.939692621))
            Line((11.377691038, -5.939692621), (22.598325699, -10.023669647))
            ThreePointArc((22.598325699, -10.023669647), (23.880038464, -9.42599717), (23.282365986, -8.144284406))
        make_face()
        with BuildLine():
            Line((48.212938712, -16.811828882), (36.992304051, -12.727851856))
            ThreePointArc((36.992304051, -12.727851856), (35.710591286, -13.325524333), (36.308263764, -14.607237098))
            Line((36.308263764, -14.607237098), (47.528898426, -18.691214124))
            ThreePointArc((47.528898426, -18.691214124), (48.81061119, -18.093541647), (48.212938712, -16.811828882))
        make_face()
        with BuildLine():
            Line((35.712938712, -16.811828882), (24.492304051, -12.727851856))
            ThreePointArc((24.492304051, -12.727851856), (23.210591286, -13.325524333), (23.808263764, -14.607237098))
            Line((23.808263764, -14.607237098), (35.028898426, -18.691214124))
            ThreePointArc((35.028898426, -18.691214124), (36.31061119, -18.093541647), (35.712938712, -16.811828882))
        make_face()
        with BuildLine():
            Line((23.212938712, -16.811828882), (11.992304051, -12.727851856))
            ThreePointArc((11.992304051, -12.727851856), (10.710591286, -13.325524333), (11.308263764, -14.607237098))
            Line((11.308263764, -14.607237098), (22.528898426, -18.691214124))
            ThreePointArc((22.528898426, -18.691214124), (23.81061119, -18.093541647), (23.212938712, -16.811828882))
        make_face()
    extrude(amount=-CUT_EXTRUDE4_DEPTH, mode=Mode.SUBTRACT)

    # Sketch7 → Cut-Extrude5 (cut, through all)
    with BuildSketch(Plane.XZ):
        with Locations((-54.742827227, 53.4035)):
            Circle(SKETCH7_R)
        with Locations((-54.742827227, 45.1485)):
            Circle(SKETCH7_R)
        with Locations((-54.742827227, -45.1485)):
            Circle(SKETCH7_R)
        with Locations((-54.742827227, -53.4035)):
            Circle(SKETCH7_R)
        with Locations((-56.934923475, 46.101)):
            Rectangle(SKETCH7_W, SKETCH7_H)
        with Locations((-56.934923475, -46.101)):
            Rectangle(SKETCH7_W, SKETCH7_H)
    extrude(amount=-CUT_EXTRUDE5_DEPTH, mode=Mode.SUBTRACT)

    # Sketch9 → Cut-Extrude6 (cut, through all)
    with BuildSketch(Plane.XZ):
        with Locations(Location((-47.697019723, 53.4035, 0), (0, 0, 270))):
            Circle(SKETCH9_R)
        with Locations(Location((-47.697019723, 45.1485, 0), (0, 0, 270))):
            Circle(SKETCH9_R)
        with Locations(Location((-47.697019723, -45.1485, 0), (0, 0, 90))):
            Circle(SKETCH9_R)
        with Locations(Location((-47.697019723, -53.4035, 0), (0, 0, 90))):
            Circle(SKETCH9_R)
        with Locations((-53.412019723, 46.101)):
            Rectangle(SKETCH9_W, SKETCH9_H)
        with Locations((-53.412019723, -46.101)):
            Rectangle(SKETCH9_W, SKETCH9_H)
    extrude(amount=-CUT_EXTRUDE6_DEPTH, mode=Mode.SUBTRACT)

    # Sketch10 → Boss-Extrude2 (add)
    with BuildSketch(Plane(origin=(0, 2, 0), x_dir=(1, 0, 0), z_dir=(0, 1, 0))):
        with Locations((-18.280288819, 0)):
            Rectangle(SKETCH10_W, SKETCH10_H)
        with Locations((51.870980277, 0)):
            Rectangle(SKETCH10_W_2, SKETCH10_H_2)
    extrude(amount=-BOSS_EXTRUDE2_DEPTH)

    # Sketch11 → Cut-Extrude7 (cut, through all)
    with BuildSketch(Plane(origin=(0, 2, 0), x_dir=(1, 0, 0), z_dir=(0, 1, 0))):
        with Locations((-41.63597787, -38.481)):
            Rectangle(SKETCH11_W, SKETCH11_H)
    extrude(amount=-CUT_EXTRUDE7_DEPTH, mode=Mode.SUBTRACT)


with BuildPart() as cut_extrude7_piece_1:
    # of the separate pieces the step leaves, piece 1, a body of its own (cut_extrude7_pieces)
    add(part.part.solids().sort_by_distance((-50.872019723, 2, -28.321))[0])

    # Sketch12 → Cut-Extrude8 (cut, through all)
    with BuildSketch(Plane(origin=(0, 2, 0), x_dir=(1, 0, 0), z_dir=(0, 1, 0))):
        Polygon((-32.399936017, 34.671), (-69.840957795, 34.671), (-69.840957795, 70.713964433), (61.672853026, 70.713964433), (61.672853026, 34.671), align=None)
    extrude(amount=-CUT_EXTRUDE8_DEPTH, mode=Mode.SUBTRACT)

    # Sketch13 → Boss-Extrude3 (add)
    with BuildSketch(Plane(origin=(0, 2, 0), x_dir=(1, 0, 0), z_dir=(0, 1, 0))):
        Polygon((55.045980277, 49.911), (-32.399936017, 49.911), (-32.399936017, 34.671), (-50.872019723, 34.671), (-50.872019723, 56.261), (55.045980277, 56.261), align=None)
        with Locations(Location((29.531895576, 53.093697243, 0), (0, 0, 270))):
            Circle(SKETCH13_R, mode=Mode.SUBTRACT)
        with Locations(Location((-0.948104424, 53.086, 0), (0, 0, 270))):
            Circle(SKETCH13_R, mode=Mode.SUBTRACT)
        with Locations(Location((-36.538995414, 53.086, 0), (0, 0, 270))):
            Circle(SKETCH13_R, mode=Mode.SUBTRACT)
        with Locations(Location((-47.697019723, 45.7835, 0), (0, 0, 270))):
            Circle(SKETCH13_R, mode=Mode.SUBTRACT)
        with Locations(Location((-47.697019723, 37.5285, 0), (0, 0, 270))):
            Circle(SKETCH13_R, mode=Mode.SUBTRACT)
    extrude(amount=-BOSS_EXTRUDE3_DEPTH)

    # Sketch15 → Boss-Extrude6 (add)
    with BuildSketch(Plane(origin=(0, 2, 0), x_dir=(1, 0, 0), z_dir=(0, 1, 0))):
        Polygon((-50.872019723, -34.671), (-50.872019723, -56.261), (55.045980277, -56.261), (55.045980277, -49.911), (-32.399936017, -49.911), (-32.399936017, -34.671), align=None)
        with Locations(Location((-47.697019723, -45.7835, 0), (0, 0, 270))):
            Circle(SKETCH15_R, mode=Mode.SUBTRACT)
        with Locations(Location((-47.697019723, -37.5285, 0), (0, 0, 270))):
            Circle(SKETCH15_R, mode=Mode.SUBTRACT)
        with Locations(Location((-36.538995414, -53.086, 0), (0, 0, 270))):
            Circle(SKETCH15_R, mode=Mode.SUBTRACT)
        with Locations(Location((-0.948104424, -53.086, 0), (0, 0, 270))):
            Circle(SKETCH15_R, mode=Mode.SUBTRACT)
        with Locations(Location((29.531895576, -53.093697243, 0), (0, 0, 270))):
            Circle(SKETCH15_R, mode=Mode.SUBTRACT)
    extrude(amount=-BOSS_EXTRUDE6_DEPTH)

    # Sketch16 → Boss-Extrude7 (add)
    with BuildSketch(Plane.XZ):
        with Locations((-48.131896009, -42.111008016)):
            Rectangle(SKETCH16_W, SKETCH16_H)
        with Locations((-47.11527877, 41.979427187)):
            Rectangle(SKETCH16_W_2, SKETCH16_H_2)
    extrude(amount=-BOSS_EXTRUDE7_DEPTH)

    # Sketch17 → Cut-Extrude10 (cut, through all)
    with BuildSketch(Plane(origin=(0, 2, 0), x_dir=(1, 0, 0), z_dir=(0, 1, 0))):
        with Locations(Location((-47.697019723, -38.481, 0), (0, 0, 270))):
            Circle(SKETCH17_R)
        with Locations(Location((-47.697019723, -46.101, 0), (0, 0, 90))):
            Circle(SKETCH17_R)
        with Locations(Location((-47.697019723, 38.481, 0), (0, 0, 90))):
            Circle(SKETCH17_R)
        with Locations(Location((-47.697019723, 46.101, 0), (0, 0, 270))):
            Circle(SKETCH17_R)
    extrude(amount=-CUT_EXTRUDE10_DEPTH, mode=Mode.SUBTRACT)

    # Sketch18 → Boss-Extrude8 (add)
    with BuildSketch(Plane.XZ):
        with Locations((15.639282332, 0)):
            Rectangle(SKETCH18_W, SKETCH18_H)
    extrude(amount=-BOSS_EXTRUDE8_DEPTH)


with BuildPart() as cut_extrude7_piece_2:
    # of the separate pieces the step leaves, piece 2, a body of its own (cut_extrude7_pieces)
    add(part.part.solids().sort_by_distance((-32.399936017, 2, 42.291))[0])

    # Sketch14 → Cut-Extrude9 (cut, through all)
    with BuildSketch(Plane(origin=(0, 2, 0), x_dir=(1, 0, 0), z_dir=(0, 1, 0))):
        Polygon((-32.399936017, -42.291), (-50.872019723, -42.291), (-50.872019723, -63.881), (55.045980277, -63.881), (55.045980277, -57.531), (-32.399936017, -57.531), align=None)
    extrude(amount=-CUT_EXTRUDE9_DEPTH, mode=Mode.SUBTRACT)


solid = cut_extrude7_piece_1.part
